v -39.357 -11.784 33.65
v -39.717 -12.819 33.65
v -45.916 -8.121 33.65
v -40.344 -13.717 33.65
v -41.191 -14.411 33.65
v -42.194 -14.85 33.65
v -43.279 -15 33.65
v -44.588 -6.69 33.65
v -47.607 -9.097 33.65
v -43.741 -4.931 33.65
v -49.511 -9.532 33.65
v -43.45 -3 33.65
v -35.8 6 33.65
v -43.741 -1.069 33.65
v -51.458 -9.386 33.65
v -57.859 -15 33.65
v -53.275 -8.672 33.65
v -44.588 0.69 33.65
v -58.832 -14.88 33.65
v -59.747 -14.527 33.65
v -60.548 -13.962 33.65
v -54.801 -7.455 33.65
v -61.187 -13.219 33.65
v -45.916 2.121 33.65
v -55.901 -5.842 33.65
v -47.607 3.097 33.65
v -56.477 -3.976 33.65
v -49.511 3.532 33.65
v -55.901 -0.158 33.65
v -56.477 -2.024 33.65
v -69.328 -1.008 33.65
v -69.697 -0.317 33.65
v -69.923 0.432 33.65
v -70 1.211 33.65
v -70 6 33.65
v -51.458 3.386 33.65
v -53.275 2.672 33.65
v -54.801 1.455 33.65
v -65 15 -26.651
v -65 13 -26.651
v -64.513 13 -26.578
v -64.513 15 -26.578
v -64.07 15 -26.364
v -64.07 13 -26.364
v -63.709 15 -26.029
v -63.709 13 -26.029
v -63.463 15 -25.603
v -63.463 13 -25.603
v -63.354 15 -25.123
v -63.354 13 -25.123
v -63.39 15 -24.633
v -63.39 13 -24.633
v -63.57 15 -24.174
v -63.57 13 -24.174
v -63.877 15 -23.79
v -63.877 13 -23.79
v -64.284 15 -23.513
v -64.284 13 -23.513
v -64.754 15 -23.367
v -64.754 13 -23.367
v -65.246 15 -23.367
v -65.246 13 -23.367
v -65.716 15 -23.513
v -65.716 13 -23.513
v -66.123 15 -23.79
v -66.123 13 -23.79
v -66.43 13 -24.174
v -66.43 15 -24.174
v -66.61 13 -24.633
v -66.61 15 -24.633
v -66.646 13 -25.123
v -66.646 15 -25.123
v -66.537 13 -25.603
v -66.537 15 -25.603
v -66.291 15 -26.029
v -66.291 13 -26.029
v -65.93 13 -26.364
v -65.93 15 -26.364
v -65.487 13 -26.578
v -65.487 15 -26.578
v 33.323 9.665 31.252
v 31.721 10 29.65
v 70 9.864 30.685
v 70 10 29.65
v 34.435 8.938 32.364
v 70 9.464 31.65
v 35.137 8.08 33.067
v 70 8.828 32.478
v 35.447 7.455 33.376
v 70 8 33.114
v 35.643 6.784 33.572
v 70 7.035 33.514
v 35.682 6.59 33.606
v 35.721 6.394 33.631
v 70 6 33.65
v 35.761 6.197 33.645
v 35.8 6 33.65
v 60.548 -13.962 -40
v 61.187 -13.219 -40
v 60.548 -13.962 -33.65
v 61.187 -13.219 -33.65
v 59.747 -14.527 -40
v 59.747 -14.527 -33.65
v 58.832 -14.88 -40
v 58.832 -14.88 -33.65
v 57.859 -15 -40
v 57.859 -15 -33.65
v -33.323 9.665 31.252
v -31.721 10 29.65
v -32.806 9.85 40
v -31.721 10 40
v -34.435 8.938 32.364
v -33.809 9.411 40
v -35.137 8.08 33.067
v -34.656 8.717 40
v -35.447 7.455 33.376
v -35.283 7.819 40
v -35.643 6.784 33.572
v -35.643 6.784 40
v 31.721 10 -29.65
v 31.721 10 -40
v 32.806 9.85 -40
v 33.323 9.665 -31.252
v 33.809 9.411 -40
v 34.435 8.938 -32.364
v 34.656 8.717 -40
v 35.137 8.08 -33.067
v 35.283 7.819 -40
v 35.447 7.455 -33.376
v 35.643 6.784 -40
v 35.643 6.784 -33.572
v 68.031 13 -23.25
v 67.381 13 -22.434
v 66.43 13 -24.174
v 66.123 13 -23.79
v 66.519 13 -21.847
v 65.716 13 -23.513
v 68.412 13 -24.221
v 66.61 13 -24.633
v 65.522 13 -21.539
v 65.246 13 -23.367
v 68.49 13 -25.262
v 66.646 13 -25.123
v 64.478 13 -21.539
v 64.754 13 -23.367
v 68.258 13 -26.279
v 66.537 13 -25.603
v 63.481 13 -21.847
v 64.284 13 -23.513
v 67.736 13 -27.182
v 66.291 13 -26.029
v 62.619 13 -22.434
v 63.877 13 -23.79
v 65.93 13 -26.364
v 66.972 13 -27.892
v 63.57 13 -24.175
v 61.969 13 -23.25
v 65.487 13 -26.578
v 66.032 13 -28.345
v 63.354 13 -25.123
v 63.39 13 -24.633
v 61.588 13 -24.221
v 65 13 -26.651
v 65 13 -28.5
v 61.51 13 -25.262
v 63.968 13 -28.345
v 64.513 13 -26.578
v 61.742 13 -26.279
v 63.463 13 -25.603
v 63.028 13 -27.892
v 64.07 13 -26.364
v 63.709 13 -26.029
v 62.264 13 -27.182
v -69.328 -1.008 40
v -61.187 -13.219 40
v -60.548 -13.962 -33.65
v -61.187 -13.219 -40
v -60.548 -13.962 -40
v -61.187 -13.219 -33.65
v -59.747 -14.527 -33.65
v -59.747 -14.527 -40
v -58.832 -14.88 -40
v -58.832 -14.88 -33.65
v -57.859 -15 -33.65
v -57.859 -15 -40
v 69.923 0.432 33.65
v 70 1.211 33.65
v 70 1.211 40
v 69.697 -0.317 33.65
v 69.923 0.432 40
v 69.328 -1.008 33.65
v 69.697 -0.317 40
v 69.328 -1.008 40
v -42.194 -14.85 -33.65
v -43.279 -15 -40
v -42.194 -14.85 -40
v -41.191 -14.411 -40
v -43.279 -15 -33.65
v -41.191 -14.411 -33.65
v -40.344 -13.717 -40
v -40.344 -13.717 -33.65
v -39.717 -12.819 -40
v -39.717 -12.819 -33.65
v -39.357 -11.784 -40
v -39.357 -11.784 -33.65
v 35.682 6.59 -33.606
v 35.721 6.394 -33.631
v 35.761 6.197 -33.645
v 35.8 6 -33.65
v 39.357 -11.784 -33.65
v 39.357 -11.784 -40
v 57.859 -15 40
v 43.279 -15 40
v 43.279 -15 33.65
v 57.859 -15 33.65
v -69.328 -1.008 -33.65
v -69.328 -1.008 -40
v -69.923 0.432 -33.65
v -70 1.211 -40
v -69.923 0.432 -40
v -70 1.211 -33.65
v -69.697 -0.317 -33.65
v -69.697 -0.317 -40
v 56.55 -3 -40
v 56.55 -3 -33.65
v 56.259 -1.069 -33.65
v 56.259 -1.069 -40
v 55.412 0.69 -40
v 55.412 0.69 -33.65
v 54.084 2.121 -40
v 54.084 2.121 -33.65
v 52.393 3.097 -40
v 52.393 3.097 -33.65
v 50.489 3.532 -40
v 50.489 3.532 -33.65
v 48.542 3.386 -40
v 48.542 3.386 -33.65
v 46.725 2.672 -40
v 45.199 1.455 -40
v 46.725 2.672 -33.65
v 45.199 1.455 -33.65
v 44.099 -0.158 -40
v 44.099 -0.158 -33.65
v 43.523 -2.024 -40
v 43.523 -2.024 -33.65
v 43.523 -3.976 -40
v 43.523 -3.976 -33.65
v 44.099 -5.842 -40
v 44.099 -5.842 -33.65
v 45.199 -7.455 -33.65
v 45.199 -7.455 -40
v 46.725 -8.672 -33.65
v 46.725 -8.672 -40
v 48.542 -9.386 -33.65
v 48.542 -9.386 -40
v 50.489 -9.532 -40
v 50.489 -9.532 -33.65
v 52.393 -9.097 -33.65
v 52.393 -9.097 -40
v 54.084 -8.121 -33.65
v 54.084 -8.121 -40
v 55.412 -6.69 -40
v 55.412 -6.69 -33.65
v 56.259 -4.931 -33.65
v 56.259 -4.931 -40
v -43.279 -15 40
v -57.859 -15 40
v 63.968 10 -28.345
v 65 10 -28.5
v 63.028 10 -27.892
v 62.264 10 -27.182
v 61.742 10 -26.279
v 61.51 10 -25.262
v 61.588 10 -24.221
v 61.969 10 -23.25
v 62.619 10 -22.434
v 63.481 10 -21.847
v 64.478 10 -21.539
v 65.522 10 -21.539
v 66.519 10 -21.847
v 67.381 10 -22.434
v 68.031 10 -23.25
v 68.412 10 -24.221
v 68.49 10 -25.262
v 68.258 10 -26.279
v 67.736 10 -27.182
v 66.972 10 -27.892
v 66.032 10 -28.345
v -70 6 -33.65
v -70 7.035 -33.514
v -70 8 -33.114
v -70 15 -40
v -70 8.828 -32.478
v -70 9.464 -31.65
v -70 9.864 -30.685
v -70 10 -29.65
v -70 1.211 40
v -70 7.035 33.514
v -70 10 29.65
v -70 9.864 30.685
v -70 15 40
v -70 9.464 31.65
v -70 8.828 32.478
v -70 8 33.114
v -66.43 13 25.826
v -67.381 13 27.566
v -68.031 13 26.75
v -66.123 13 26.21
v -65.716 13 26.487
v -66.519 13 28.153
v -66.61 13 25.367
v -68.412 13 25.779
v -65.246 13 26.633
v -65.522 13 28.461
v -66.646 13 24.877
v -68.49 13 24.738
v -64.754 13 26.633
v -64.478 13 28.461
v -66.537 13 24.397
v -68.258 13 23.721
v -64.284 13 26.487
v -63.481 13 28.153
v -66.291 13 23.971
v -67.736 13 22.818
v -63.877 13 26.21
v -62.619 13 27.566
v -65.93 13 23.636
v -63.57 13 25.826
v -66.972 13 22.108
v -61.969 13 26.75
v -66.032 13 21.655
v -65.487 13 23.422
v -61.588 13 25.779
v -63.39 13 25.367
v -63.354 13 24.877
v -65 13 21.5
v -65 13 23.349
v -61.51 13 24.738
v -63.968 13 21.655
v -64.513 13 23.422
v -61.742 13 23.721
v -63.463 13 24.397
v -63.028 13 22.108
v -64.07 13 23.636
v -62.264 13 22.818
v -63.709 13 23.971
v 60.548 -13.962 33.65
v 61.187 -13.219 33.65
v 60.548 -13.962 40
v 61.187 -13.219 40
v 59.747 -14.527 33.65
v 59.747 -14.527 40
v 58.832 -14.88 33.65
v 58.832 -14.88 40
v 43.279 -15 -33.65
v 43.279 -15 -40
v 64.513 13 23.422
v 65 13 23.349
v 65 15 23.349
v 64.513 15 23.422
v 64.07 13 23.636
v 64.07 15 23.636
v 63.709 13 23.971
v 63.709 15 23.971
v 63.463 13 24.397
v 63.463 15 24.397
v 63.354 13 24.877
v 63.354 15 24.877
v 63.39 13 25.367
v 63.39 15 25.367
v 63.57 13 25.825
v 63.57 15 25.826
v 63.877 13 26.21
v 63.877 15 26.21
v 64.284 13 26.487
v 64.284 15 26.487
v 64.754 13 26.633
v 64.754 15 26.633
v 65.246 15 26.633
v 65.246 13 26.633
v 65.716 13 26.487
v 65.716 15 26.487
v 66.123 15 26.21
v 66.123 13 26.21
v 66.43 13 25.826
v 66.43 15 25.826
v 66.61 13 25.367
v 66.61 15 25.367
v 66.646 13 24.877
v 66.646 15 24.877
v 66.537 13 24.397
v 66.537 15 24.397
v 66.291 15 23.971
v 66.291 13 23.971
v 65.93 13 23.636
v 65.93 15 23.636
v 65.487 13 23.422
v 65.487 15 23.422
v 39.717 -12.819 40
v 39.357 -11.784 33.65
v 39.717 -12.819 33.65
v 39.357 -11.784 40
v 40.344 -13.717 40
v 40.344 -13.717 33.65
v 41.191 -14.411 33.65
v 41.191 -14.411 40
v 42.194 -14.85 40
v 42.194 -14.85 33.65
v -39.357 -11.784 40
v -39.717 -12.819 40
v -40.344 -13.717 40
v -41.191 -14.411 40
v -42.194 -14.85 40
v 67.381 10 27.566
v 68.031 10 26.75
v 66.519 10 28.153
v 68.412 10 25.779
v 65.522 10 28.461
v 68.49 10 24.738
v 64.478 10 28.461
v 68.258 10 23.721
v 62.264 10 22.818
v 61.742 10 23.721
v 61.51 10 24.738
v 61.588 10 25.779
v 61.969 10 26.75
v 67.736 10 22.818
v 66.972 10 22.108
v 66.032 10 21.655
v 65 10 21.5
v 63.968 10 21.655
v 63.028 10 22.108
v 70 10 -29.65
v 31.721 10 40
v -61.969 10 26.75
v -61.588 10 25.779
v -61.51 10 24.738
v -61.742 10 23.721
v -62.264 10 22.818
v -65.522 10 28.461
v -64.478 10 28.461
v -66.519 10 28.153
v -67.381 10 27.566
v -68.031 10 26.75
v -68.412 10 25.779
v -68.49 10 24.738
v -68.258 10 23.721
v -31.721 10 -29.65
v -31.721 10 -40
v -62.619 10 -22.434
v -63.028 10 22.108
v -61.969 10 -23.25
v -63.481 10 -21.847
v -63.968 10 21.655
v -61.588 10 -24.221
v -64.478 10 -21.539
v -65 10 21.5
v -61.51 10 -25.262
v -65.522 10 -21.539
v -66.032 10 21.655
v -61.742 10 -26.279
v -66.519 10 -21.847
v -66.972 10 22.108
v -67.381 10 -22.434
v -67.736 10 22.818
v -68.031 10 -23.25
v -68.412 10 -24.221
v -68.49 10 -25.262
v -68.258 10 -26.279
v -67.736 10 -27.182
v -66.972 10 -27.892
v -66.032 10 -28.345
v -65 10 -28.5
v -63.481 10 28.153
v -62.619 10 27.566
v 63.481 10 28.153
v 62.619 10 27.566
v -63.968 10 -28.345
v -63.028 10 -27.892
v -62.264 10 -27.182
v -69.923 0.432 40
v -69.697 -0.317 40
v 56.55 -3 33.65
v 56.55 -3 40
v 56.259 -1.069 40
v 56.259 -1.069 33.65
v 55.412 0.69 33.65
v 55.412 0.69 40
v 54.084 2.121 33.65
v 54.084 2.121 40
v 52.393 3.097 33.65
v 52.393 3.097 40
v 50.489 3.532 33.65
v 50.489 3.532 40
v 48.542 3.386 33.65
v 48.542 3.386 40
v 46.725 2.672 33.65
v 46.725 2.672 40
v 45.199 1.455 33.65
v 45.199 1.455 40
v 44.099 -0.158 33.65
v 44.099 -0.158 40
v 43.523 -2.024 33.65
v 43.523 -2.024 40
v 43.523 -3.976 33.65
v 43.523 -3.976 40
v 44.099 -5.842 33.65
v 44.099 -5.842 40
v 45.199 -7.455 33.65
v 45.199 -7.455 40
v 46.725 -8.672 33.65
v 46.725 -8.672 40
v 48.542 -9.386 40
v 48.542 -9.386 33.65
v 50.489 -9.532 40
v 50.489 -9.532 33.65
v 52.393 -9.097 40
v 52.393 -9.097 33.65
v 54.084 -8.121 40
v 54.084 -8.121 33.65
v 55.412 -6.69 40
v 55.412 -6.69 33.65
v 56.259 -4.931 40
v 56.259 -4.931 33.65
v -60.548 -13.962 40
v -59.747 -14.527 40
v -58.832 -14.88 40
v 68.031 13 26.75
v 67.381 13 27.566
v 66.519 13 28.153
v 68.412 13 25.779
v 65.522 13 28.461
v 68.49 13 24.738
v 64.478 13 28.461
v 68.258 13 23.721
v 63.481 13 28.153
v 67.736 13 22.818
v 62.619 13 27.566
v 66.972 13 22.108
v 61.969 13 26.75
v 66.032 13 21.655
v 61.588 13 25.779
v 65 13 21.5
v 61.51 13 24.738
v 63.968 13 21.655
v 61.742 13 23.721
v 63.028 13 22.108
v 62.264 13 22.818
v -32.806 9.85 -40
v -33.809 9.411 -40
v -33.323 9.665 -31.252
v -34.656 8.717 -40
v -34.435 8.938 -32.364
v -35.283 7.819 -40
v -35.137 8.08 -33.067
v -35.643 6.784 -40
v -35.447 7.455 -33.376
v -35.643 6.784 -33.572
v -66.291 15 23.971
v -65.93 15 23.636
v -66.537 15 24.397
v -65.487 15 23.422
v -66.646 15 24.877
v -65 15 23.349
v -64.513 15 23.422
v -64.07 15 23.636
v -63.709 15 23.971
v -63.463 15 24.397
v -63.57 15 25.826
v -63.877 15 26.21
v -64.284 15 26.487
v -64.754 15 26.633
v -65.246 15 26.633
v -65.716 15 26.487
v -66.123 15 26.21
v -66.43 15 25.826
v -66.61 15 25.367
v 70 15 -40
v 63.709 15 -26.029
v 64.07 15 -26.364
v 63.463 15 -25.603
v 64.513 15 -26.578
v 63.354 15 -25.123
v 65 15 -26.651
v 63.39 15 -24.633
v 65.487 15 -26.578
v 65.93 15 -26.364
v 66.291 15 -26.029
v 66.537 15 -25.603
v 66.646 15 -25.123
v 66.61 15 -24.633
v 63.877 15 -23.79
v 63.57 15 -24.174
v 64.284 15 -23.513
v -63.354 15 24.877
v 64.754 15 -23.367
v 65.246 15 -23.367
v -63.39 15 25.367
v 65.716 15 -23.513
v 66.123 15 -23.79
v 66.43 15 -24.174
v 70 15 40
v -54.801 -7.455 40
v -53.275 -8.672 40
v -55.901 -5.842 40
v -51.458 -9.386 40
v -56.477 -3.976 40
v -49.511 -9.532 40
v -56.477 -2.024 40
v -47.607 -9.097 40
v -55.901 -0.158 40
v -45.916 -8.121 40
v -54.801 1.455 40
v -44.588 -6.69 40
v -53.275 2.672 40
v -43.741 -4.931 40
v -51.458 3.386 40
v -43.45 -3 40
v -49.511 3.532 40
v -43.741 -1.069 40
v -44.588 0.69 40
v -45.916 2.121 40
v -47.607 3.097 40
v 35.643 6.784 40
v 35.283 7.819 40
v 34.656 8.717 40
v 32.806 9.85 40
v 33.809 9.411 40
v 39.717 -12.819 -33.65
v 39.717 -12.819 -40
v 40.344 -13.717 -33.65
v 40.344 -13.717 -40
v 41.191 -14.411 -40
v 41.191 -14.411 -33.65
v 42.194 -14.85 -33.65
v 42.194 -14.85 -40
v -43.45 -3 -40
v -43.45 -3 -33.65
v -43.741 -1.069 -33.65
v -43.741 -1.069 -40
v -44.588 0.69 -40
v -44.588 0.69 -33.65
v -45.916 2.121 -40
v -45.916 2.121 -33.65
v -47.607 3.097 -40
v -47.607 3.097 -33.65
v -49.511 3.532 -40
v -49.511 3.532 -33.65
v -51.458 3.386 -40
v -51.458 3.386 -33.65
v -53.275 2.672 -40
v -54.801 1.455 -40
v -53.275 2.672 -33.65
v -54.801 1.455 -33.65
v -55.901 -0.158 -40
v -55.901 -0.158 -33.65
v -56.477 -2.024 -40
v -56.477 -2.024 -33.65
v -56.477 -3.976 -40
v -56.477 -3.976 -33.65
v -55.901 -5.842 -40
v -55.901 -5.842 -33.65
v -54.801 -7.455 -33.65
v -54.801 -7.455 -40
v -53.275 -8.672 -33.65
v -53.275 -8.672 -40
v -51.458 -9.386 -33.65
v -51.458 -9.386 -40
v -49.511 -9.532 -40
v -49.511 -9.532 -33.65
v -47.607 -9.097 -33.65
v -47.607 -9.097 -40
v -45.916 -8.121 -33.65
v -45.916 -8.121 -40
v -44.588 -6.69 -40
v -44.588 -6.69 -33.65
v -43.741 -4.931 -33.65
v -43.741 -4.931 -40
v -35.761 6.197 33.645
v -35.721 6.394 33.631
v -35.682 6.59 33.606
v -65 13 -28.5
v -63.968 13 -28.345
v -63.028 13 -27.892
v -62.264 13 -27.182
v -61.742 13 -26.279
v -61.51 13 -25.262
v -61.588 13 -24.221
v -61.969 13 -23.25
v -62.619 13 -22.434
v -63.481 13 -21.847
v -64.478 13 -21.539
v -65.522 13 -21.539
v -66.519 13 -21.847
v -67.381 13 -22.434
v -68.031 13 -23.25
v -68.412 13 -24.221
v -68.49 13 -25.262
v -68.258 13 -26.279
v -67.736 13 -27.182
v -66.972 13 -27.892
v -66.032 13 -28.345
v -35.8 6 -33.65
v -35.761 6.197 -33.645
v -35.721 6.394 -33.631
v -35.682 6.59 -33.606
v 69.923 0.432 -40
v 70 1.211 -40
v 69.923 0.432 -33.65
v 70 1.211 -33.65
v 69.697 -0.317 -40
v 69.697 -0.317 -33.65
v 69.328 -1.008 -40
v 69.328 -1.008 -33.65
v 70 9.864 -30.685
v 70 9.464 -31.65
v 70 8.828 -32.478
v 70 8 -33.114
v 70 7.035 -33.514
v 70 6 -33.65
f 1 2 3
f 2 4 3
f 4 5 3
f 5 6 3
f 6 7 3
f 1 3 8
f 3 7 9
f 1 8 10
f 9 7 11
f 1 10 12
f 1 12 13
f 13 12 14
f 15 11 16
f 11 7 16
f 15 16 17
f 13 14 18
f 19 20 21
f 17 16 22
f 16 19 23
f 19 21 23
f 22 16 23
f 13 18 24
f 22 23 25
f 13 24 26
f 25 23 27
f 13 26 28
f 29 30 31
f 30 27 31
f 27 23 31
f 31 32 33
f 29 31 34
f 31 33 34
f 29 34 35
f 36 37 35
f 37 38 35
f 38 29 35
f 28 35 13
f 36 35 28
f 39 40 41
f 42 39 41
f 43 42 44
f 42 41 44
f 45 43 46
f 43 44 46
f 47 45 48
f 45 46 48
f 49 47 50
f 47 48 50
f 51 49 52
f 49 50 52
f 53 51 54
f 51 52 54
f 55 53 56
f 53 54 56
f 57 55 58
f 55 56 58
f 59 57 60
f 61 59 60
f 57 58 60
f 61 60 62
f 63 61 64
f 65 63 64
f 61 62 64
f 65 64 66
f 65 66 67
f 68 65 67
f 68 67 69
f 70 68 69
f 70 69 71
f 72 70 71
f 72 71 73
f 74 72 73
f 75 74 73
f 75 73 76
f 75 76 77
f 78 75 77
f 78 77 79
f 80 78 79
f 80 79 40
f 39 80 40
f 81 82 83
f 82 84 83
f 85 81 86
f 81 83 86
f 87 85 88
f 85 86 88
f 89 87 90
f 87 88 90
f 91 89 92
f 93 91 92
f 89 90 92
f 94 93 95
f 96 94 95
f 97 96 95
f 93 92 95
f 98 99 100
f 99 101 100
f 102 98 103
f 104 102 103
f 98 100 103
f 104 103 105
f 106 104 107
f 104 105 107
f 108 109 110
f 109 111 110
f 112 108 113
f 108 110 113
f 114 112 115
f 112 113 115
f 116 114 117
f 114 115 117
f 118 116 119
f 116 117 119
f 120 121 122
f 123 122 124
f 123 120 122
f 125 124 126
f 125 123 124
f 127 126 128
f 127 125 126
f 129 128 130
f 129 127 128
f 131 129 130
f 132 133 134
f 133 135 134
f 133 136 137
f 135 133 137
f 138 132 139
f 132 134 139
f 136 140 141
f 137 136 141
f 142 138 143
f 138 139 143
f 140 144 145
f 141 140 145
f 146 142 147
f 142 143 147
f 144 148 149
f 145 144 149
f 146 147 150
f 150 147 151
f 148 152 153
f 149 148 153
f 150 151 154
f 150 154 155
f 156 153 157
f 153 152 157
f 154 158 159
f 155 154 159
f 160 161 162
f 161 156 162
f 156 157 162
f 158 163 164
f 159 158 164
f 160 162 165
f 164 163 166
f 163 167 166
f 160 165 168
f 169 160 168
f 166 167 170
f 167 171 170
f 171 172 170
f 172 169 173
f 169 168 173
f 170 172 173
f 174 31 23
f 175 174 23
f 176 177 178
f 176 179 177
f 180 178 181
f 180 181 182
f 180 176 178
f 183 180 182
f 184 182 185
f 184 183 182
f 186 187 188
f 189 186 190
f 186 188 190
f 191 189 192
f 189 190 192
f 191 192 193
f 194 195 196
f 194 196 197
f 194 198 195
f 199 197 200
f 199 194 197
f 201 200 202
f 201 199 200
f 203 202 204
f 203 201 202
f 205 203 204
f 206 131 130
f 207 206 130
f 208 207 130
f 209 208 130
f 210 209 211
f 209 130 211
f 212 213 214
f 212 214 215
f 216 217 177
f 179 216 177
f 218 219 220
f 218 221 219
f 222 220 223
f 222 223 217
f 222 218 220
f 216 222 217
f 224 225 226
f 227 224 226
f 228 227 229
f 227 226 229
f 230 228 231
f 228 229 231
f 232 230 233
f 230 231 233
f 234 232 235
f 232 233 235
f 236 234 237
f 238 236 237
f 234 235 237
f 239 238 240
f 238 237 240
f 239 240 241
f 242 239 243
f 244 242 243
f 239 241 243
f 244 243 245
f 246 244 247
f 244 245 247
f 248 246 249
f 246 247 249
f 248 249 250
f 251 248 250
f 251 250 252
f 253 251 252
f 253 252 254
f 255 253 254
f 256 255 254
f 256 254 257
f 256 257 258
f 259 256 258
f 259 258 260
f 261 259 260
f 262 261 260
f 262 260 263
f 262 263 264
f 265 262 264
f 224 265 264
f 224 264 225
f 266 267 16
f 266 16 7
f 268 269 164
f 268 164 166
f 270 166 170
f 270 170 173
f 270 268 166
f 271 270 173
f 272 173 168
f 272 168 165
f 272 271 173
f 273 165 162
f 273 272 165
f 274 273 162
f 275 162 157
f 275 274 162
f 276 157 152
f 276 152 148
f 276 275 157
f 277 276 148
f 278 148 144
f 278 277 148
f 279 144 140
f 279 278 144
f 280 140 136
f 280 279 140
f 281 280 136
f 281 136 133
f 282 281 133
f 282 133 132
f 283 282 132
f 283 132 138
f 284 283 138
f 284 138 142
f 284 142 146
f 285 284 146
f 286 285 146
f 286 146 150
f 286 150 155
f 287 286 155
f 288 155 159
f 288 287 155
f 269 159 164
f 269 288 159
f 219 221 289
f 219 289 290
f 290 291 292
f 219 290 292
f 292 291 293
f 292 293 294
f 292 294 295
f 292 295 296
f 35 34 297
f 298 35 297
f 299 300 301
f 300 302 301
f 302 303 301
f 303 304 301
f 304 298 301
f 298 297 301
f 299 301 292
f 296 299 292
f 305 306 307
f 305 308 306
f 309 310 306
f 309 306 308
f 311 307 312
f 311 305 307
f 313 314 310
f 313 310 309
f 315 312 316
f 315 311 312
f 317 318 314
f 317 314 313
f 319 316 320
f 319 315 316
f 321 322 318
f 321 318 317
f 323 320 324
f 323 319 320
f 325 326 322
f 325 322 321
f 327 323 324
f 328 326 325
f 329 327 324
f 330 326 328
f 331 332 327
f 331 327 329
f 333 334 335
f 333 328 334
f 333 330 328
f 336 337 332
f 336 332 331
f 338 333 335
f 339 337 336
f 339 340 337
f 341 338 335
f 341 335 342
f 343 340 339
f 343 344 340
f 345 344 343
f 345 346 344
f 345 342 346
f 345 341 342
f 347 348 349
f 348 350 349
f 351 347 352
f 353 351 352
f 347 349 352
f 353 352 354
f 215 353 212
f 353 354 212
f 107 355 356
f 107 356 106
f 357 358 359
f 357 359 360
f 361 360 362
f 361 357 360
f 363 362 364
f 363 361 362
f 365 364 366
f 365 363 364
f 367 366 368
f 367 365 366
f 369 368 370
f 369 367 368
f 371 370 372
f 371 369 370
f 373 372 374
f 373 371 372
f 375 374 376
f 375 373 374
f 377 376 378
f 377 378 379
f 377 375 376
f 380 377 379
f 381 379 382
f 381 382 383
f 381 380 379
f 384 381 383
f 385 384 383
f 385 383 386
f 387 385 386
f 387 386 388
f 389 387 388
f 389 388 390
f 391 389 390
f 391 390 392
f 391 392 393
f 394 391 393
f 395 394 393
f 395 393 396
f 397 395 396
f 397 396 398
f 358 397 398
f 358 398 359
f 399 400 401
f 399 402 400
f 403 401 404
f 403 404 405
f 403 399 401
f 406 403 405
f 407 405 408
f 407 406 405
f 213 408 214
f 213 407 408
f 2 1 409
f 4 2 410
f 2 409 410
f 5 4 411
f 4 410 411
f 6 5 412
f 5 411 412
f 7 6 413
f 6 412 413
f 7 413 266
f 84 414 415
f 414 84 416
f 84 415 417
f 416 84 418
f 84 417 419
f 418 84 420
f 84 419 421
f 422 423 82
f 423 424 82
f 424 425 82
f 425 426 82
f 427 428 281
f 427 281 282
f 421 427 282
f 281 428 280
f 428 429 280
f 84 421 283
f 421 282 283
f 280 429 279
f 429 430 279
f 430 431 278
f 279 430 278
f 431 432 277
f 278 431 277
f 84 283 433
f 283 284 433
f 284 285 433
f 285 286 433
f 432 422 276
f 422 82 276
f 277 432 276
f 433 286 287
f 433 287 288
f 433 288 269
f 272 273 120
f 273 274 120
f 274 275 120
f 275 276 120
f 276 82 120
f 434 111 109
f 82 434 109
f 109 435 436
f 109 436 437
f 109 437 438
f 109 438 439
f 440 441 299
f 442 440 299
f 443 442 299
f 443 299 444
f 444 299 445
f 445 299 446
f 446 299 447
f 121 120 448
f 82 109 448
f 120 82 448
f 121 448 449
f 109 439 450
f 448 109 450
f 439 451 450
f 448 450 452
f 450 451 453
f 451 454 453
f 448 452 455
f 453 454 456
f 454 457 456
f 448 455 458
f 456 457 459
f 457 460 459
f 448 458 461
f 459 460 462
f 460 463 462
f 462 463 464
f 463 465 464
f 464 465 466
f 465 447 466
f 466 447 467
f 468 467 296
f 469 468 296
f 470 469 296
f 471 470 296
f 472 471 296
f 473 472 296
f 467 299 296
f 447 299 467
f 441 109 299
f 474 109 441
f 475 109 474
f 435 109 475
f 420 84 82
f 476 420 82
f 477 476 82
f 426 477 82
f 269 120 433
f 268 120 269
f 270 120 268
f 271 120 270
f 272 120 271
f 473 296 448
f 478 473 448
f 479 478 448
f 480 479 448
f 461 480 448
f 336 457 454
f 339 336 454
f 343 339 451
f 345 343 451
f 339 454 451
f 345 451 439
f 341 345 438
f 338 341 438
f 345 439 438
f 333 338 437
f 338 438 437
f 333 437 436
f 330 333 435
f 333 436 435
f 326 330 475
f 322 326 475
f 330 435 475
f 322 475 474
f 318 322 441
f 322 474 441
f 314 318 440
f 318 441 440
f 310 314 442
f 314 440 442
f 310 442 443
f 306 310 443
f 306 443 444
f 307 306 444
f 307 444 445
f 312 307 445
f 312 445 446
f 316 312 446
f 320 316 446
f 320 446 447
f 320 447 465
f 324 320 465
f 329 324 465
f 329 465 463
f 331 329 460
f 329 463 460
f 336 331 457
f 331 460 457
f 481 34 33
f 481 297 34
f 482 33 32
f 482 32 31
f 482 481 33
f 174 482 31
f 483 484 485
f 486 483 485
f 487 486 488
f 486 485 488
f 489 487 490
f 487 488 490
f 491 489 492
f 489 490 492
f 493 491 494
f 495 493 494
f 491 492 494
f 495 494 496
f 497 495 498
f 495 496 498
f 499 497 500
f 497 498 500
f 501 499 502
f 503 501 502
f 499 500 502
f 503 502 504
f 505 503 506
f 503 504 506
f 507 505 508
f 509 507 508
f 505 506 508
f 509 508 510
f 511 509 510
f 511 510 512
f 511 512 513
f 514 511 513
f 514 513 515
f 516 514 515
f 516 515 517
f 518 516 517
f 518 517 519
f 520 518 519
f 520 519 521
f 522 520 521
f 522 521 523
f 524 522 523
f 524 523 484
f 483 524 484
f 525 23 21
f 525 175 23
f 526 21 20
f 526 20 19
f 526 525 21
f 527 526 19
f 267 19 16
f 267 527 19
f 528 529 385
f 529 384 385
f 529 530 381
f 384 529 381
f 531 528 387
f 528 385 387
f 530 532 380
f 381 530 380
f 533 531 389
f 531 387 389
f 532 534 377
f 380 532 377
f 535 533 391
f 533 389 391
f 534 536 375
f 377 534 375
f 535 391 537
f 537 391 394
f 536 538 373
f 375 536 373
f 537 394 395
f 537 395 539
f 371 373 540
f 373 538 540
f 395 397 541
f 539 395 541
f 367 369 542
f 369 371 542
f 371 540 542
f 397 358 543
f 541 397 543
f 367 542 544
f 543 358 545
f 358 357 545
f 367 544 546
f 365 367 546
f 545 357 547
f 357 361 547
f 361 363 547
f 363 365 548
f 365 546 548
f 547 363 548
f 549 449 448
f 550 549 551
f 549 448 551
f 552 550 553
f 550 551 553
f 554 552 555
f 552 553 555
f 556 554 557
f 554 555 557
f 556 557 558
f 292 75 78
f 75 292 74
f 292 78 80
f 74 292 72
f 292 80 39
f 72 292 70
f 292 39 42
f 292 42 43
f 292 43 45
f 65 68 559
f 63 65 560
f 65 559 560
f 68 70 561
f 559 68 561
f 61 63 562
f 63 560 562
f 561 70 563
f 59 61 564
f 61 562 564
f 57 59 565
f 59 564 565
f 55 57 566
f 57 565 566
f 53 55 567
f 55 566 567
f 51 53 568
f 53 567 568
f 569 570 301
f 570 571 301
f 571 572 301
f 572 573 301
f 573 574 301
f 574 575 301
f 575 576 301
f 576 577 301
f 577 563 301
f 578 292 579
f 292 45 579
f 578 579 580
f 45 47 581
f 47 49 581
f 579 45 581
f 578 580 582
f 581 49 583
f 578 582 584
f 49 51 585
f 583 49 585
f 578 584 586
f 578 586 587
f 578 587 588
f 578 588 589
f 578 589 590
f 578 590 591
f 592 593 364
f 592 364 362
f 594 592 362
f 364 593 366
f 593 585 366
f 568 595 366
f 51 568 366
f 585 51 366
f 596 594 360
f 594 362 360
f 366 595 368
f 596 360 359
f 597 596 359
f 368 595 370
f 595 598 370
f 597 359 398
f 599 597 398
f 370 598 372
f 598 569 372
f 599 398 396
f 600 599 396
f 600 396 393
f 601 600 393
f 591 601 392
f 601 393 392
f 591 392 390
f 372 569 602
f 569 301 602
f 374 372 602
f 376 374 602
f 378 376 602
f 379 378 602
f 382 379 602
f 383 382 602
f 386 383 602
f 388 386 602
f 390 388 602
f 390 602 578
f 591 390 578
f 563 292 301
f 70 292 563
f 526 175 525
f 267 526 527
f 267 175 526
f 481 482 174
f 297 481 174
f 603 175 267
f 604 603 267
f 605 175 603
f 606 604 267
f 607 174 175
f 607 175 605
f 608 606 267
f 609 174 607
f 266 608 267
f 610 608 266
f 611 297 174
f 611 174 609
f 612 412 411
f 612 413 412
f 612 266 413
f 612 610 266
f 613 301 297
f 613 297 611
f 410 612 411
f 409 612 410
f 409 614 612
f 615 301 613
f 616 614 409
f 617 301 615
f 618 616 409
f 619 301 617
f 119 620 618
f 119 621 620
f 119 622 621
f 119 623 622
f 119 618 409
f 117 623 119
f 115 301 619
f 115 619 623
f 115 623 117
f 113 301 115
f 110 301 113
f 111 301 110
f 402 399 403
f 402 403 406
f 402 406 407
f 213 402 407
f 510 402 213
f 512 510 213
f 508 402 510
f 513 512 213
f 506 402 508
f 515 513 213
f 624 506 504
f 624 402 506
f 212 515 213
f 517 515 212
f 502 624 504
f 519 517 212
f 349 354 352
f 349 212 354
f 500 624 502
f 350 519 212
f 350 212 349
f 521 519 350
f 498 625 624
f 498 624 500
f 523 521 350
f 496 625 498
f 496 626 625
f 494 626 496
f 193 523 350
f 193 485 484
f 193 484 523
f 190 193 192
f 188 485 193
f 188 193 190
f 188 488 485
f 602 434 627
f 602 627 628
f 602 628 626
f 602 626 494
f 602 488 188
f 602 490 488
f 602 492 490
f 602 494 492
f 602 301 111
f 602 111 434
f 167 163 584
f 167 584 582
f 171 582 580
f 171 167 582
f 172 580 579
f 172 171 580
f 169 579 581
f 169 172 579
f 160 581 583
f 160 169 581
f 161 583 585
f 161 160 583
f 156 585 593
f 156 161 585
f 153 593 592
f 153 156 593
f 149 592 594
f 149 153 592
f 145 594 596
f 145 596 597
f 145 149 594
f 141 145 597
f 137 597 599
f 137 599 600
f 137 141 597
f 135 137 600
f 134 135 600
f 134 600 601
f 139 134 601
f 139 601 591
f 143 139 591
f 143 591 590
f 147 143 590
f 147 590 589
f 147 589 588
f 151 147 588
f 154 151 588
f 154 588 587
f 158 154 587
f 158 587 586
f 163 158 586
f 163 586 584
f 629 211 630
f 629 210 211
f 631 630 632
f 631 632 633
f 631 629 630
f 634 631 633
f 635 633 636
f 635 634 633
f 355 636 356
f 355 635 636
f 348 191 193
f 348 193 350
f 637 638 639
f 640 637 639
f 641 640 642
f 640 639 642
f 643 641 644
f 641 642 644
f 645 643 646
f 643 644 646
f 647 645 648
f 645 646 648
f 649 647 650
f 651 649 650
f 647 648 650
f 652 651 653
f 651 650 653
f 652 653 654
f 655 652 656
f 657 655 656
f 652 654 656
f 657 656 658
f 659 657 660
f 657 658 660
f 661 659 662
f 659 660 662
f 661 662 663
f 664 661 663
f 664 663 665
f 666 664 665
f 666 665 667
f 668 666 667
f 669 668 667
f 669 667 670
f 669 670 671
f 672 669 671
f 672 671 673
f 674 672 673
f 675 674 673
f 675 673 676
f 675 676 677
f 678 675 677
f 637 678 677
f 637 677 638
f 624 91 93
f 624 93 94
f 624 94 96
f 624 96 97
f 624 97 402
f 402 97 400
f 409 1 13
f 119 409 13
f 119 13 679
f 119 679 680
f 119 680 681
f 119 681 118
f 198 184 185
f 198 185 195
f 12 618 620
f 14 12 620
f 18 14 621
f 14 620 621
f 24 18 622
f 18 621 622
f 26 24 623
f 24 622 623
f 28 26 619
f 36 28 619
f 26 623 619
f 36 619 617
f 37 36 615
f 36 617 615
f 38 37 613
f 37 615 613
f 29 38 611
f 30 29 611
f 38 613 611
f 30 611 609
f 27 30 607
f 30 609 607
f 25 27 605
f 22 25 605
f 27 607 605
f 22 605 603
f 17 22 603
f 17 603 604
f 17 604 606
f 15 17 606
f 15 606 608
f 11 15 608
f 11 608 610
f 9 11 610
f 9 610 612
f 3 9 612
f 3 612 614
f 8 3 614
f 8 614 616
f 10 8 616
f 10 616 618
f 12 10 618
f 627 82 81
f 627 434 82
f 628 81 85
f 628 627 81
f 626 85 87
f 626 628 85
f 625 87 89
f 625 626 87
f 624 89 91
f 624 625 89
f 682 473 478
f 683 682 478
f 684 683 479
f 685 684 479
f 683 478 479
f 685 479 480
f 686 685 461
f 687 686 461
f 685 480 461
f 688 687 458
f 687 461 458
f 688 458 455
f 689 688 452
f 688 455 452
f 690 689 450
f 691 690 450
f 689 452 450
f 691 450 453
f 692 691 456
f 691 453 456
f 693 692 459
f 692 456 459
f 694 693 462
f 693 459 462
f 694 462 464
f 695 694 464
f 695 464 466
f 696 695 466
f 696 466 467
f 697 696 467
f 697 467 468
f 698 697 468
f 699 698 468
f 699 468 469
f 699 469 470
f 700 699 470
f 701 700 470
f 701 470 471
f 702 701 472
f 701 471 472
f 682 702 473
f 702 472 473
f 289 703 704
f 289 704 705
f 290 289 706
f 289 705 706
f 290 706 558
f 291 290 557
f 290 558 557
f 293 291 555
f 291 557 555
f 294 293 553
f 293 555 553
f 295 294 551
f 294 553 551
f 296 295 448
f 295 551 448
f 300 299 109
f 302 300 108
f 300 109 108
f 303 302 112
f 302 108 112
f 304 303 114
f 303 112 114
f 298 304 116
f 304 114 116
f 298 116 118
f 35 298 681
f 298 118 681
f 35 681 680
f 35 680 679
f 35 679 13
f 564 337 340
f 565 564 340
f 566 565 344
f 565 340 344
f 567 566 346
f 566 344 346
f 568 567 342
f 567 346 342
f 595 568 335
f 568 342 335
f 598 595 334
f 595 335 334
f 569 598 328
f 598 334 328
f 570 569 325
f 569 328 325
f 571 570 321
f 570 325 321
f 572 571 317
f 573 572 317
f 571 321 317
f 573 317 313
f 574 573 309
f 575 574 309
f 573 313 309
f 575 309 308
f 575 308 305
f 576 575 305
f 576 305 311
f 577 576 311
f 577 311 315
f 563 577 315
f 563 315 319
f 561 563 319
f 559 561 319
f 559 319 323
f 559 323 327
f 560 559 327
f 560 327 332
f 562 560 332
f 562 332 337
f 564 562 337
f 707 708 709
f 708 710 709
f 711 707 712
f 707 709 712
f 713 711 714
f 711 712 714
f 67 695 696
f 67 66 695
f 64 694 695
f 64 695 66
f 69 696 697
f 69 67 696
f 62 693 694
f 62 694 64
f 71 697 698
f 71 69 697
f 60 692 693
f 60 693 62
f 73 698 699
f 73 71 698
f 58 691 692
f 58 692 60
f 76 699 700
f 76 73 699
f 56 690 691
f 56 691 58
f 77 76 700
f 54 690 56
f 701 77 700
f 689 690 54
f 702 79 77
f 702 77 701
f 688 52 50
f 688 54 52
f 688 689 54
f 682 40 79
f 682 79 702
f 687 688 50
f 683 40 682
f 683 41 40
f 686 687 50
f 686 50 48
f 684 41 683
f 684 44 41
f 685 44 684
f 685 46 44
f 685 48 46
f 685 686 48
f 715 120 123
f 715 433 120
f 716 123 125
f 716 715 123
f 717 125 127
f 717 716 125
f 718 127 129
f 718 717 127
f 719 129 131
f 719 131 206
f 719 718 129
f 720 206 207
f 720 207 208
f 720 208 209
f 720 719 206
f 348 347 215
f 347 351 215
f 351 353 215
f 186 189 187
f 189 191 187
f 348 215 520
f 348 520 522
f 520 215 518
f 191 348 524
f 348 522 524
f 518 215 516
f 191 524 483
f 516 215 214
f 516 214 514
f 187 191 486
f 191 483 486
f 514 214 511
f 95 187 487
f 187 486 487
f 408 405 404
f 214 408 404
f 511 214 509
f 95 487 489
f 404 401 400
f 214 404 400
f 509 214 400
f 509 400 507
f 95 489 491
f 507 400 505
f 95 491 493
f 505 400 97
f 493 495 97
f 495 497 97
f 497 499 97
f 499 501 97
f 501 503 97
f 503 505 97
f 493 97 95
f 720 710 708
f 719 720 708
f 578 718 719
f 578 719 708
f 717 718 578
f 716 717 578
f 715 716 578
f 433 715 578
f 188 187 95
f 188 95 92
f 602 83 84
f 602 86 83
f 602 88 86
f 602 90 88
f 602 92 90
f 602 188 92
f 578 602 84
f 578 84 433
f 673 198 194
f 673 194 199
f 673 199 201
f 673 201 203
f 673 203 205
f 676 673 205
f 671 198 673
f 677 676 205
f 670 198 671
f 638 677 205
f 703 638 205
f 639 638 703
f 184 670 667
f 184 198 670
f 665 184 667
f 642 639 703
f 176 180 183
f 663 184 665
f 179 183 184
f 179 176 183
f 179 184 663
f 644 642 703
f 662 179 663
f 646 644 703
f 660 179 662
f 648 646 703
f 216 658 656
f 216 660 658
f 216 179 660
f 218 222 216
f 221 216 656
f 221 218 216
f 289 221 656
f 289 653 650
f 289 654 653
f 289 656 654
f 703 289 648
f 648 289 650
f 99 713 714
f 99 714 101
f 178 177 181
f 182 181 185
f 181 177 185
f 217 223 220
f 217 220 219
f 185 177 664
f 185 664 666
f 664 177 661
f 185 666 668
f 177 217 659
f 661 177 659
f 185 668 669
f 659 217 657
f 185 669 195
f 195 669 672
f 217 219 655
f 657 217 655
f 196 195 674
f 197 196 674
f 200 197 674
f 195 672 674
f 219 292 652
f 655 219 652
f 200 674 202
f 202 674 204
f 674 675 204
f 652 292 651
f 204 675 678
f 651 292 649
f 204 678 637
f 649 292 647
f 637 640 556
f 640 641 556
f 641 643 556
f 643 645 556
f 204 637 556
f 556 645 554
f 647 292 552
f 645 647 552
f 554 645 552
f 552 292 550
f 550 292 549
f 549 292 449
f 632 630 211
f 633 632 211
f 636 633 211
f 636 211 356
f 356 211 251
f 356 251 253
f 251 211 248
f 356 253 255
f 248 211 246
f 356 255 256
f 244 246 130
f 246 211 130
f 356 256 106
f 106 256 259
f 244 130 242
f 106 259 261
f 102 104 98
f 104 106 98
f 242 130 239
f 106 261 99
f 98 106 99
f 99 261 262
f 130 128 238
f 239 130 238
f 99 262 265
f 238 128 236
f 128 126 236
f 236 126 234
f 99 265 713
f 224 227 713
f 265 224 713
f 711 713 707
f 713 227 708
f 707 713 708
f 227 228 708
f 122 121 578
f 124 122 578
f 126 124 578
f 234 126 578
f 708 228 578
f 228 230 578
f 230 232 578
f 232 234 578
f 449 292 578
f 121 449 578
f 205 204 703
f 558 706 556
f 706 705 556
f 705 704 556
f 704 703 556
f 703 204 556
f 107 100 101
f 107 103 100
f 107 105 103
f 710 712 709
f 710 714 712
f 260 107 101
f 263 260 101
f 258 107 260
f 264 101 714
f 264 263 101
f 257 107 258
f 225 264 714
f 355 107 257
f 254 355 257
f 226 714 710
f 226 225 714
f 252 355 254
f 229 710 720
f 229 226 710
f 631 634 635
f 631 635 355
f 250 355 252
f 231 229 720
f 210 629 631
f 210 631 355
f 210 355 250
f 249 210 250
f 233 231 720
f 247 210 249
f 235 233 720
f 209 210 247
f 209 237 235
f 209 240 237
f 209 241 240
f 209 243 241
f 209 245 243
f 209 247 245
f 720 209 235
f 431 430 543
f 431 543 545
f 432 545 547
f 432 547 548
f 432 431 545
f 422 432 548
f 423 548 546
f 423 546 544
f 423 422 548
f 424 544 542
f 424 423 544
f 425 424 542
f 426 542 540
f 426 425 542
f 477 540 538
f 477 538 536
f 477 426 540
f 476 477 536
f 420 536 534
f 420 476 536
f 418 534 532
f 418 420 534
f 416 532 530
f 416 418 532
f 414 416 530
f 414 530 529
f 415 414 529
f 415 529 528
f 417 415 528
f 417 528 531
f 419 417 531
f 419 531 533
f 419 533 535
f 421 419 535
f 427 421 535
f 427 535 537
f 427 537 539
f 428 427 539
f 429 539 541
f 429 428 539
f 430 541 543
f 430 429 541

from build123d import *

# Parameters (mm, degrees)
CROQUIS1_W                 = 140
CROQUIS1_H                 = 30
SALIENTE_EXTRUIR1_DEPTH    = 40
CORTAR_EXTRUIR1_DEPTH      = 83.006097334
CORTAR_EXTRUIR1_DEPTH_BACK = 83.006097334
CROQUIS2_W                 = 67.3
CROQUIS2_H                 = 25
CROQUIS3_R                 = 6.55
CORTAR_EXTRUIR2_DEPTH      = 80
CORTAR_EXTRUIR3_REACH      = 86.41
CROQUIS4_R                 = 1.651
CROQUIS5_R                 = 3.5
CROQUIS5_R_2               = 1.651
CORTAR_EXTRUIR4_DEPTH      = 3
CORTAR_EXTRUIR5_DEPTH      = 83.006097334
CORTAR_EXTRUIR5_DEPTH_BACK = 83.006097334
REDONDEO1_R                = 4


with BuildPart() as part:
    # Croquis1 → Saliente-Extruir1 (new, symmetric)
    with BuildSketch(Plane.XY):
        Rectangle(CROQUIS1_W, CROQUIS1_H)
    extrude(amount=SALIENTE_EXTRUIR1_DEPTH, both=True)

    # Croquis2 → Cortar-Extruir1 (cut, two sides: drawn at the far end of the back side and taken through both)
    with BuildSketch(Plane(origin=(0, 0, 0), x_dir=(0, 0, -1), z_dir=(1, 0, 0)).offset(-CORTAR_EXTRUIR1_DEPTH_BACK)):
        with Locations((0, -2.5)):
            Rectangle(CROQUIS2_W, CROQUIS2_H)
    extrude(amount=CORTAR_EXTRUIR1_DEPTH + CORTAR_EXTRUIR1_DEPTH_BACK, mode=Mode.SUBTRACT)

    # Croquis3 → Cortar-Extruir2 (cut)
    with BuildSketch(Plane.XY.offset(40)):
        with Locations((50, -3)):
            Circle(CROQUIS3_R)
        with Locations((-50, -3)):
            Circle(CROQUIS3_R)
    extrude(amount=-CORTAR_EXTRUIR2_DEPTH, mode=Mode.SUBTRACT)

    # Croquis4 → Cortar-Extruir3 (cut, up to next)
    with BuildSketch(Plane.XZ.offset(-10), mode=Mode.PRIVATE) as cortar_extruir3_sk1:
        with Locations(Location((-65, 25, 0), (0, 0, 270))):
            Circle(CROQUIS4_R)
    cortar_extruir3_tool1 = extrude(cortar_extruir3_sk1.sketch, amount=-CORTAR_EXTRUIR3_REACH, mode=Mode.PRIVATE) & part.part
    # Croquis4 → Cortar-Extruir3 (cut, up to next)
    with BuildSketch(Plane.XZ.offset(-10), mode=Mode.PRIVATE) as cortar_extruir3_sk2:
        with Locations(Location((-65, -25, 0), (0, 0, 270))):
            Circle(CROQUIS4_R)
    cortar_extruir3_tool2 = extrude(cortar_extruir3_sk2.sketch, amount=-CORTAR_EXTRUIR3_REACH, mode=Mode.PRIVATE) & part.part
    cortar_extruir3_1 = cortar_extruir3_tool1.solids().sort_by_distance((-65, 10, 25))[0]
    add(cortar_extruir3_1, mode=Mode.SUBTRACT)
    cortar_extruir3_2 = cortar_extruir3_tool2.solids().sort_by_distance((-65, 10, -25))[0]
    add(cortar_extruir3_2, mode=Mode.SUBTRACT)
    cortar_extruir3 = cortar_extruir3_1 + cortar_extruir3_2  # Cortar-Extruir3 as one shape, for the pattern or mirror that repeats it

    # Croquis5 → Cortar-Extruir4 (cut)
    # profile 1 of 2: a face of its own
    with BuildSketch(Plane.XZ.offset(-10)):
        with Locations(Location((-65, 25, 0), (0, 0, 270))):
            Circle(CROQUIS5_R)
        with Locations(Location((-65, 25, 0), (0, 0, 270))):
            Circle(CROQUIS5_R_2, mode=Mode.SUBTRACT)
    # profile 2 of 2: a face of its own
    with BuildSketch(Plane.XZ.offset(-10)):
        with Locations(Location((-65, -25, 0), (0, 0, 270))):
            Circle(CROQUIS5_R)
        with Locations(Location((-65, -25, 0), (0, 0, 270))):
            Circle(CROQUIS5_R_2, mode=Mode.SUBTRACT)
    cortar_extruir4 = extrude(amount=-CORTAR_EXTRUIR4_DEPTH, mode=Mode.SUBTRACT)

    # Croquis9 → Cortar-Extruir5 (cut, two sides: drawn at the far end of the back side and taken through both)
    with BuildSketch(Plane.XY.offset(-CORTAR_EXTRUIR5_DEPTH_BACK)):
        Polygon((-40, -15), (-35, 10), (35, 10), (40, -15), align=None)
        Polygon((-70, 0), (-60, -15), (-70, -15), align=None)
        Polygon((70, 0), (60, -15), (70, -15), align=None)
    extrude(amount=CORTAR_EXTRUIR5_DEPTH + CORTAR_EXTRUIR5_DEPTH_BACK, mode=Mode.SUBTRACT)

    # Simetría4: Cortar-Extruir3, Cortar-Extruir4 across plane
    add(cortar_extruir3.mirror(Plane(origin=(0, 0, 0), x_dir=(0, 0, 1), z_dir=(1, 0, 0))), mode=Mode.SUBTRACT)
    add(cortar_extruir4.mirror(Plane(origin=(0, 0, 0), x_dir=(0, 0, 1), z_dir=(1, 0, 0))), mode=Mode.SUBTRACT)

    # Redondeo1
    redondeo1_edges = [part.edges().sort_by_distance(p)[0] for p in [
        (-70, 0, 36.825),
        (-70, 0, -36.825),
        (-60, -15, 36.825),
        (-60, -15, -36.825),
        (70, 0, 36.825),
        (70, 0, -36.825),
        (60, -15, 36.825),
        (60, -15, -36.825),
        (-52.5, 10, 33.65),
        (-52.5, 10, -33.65),
        (52.5, 10, -33.65),
        (52.5, 10, 33.65),
        (40, -15, 36.825),
        (40, -15, -36.825),
        (-40, -15, 36.825),
        (-40, -15, -36.825),
        (-35, 10, 36.825),
        (-35, 10, -36.825),
        (35, 10, 36.825),
        (35, 10, -36.825),
    ]]
    fillet(redondeo1_edges, radius=REDONDEO1_R)


solid = part.part
